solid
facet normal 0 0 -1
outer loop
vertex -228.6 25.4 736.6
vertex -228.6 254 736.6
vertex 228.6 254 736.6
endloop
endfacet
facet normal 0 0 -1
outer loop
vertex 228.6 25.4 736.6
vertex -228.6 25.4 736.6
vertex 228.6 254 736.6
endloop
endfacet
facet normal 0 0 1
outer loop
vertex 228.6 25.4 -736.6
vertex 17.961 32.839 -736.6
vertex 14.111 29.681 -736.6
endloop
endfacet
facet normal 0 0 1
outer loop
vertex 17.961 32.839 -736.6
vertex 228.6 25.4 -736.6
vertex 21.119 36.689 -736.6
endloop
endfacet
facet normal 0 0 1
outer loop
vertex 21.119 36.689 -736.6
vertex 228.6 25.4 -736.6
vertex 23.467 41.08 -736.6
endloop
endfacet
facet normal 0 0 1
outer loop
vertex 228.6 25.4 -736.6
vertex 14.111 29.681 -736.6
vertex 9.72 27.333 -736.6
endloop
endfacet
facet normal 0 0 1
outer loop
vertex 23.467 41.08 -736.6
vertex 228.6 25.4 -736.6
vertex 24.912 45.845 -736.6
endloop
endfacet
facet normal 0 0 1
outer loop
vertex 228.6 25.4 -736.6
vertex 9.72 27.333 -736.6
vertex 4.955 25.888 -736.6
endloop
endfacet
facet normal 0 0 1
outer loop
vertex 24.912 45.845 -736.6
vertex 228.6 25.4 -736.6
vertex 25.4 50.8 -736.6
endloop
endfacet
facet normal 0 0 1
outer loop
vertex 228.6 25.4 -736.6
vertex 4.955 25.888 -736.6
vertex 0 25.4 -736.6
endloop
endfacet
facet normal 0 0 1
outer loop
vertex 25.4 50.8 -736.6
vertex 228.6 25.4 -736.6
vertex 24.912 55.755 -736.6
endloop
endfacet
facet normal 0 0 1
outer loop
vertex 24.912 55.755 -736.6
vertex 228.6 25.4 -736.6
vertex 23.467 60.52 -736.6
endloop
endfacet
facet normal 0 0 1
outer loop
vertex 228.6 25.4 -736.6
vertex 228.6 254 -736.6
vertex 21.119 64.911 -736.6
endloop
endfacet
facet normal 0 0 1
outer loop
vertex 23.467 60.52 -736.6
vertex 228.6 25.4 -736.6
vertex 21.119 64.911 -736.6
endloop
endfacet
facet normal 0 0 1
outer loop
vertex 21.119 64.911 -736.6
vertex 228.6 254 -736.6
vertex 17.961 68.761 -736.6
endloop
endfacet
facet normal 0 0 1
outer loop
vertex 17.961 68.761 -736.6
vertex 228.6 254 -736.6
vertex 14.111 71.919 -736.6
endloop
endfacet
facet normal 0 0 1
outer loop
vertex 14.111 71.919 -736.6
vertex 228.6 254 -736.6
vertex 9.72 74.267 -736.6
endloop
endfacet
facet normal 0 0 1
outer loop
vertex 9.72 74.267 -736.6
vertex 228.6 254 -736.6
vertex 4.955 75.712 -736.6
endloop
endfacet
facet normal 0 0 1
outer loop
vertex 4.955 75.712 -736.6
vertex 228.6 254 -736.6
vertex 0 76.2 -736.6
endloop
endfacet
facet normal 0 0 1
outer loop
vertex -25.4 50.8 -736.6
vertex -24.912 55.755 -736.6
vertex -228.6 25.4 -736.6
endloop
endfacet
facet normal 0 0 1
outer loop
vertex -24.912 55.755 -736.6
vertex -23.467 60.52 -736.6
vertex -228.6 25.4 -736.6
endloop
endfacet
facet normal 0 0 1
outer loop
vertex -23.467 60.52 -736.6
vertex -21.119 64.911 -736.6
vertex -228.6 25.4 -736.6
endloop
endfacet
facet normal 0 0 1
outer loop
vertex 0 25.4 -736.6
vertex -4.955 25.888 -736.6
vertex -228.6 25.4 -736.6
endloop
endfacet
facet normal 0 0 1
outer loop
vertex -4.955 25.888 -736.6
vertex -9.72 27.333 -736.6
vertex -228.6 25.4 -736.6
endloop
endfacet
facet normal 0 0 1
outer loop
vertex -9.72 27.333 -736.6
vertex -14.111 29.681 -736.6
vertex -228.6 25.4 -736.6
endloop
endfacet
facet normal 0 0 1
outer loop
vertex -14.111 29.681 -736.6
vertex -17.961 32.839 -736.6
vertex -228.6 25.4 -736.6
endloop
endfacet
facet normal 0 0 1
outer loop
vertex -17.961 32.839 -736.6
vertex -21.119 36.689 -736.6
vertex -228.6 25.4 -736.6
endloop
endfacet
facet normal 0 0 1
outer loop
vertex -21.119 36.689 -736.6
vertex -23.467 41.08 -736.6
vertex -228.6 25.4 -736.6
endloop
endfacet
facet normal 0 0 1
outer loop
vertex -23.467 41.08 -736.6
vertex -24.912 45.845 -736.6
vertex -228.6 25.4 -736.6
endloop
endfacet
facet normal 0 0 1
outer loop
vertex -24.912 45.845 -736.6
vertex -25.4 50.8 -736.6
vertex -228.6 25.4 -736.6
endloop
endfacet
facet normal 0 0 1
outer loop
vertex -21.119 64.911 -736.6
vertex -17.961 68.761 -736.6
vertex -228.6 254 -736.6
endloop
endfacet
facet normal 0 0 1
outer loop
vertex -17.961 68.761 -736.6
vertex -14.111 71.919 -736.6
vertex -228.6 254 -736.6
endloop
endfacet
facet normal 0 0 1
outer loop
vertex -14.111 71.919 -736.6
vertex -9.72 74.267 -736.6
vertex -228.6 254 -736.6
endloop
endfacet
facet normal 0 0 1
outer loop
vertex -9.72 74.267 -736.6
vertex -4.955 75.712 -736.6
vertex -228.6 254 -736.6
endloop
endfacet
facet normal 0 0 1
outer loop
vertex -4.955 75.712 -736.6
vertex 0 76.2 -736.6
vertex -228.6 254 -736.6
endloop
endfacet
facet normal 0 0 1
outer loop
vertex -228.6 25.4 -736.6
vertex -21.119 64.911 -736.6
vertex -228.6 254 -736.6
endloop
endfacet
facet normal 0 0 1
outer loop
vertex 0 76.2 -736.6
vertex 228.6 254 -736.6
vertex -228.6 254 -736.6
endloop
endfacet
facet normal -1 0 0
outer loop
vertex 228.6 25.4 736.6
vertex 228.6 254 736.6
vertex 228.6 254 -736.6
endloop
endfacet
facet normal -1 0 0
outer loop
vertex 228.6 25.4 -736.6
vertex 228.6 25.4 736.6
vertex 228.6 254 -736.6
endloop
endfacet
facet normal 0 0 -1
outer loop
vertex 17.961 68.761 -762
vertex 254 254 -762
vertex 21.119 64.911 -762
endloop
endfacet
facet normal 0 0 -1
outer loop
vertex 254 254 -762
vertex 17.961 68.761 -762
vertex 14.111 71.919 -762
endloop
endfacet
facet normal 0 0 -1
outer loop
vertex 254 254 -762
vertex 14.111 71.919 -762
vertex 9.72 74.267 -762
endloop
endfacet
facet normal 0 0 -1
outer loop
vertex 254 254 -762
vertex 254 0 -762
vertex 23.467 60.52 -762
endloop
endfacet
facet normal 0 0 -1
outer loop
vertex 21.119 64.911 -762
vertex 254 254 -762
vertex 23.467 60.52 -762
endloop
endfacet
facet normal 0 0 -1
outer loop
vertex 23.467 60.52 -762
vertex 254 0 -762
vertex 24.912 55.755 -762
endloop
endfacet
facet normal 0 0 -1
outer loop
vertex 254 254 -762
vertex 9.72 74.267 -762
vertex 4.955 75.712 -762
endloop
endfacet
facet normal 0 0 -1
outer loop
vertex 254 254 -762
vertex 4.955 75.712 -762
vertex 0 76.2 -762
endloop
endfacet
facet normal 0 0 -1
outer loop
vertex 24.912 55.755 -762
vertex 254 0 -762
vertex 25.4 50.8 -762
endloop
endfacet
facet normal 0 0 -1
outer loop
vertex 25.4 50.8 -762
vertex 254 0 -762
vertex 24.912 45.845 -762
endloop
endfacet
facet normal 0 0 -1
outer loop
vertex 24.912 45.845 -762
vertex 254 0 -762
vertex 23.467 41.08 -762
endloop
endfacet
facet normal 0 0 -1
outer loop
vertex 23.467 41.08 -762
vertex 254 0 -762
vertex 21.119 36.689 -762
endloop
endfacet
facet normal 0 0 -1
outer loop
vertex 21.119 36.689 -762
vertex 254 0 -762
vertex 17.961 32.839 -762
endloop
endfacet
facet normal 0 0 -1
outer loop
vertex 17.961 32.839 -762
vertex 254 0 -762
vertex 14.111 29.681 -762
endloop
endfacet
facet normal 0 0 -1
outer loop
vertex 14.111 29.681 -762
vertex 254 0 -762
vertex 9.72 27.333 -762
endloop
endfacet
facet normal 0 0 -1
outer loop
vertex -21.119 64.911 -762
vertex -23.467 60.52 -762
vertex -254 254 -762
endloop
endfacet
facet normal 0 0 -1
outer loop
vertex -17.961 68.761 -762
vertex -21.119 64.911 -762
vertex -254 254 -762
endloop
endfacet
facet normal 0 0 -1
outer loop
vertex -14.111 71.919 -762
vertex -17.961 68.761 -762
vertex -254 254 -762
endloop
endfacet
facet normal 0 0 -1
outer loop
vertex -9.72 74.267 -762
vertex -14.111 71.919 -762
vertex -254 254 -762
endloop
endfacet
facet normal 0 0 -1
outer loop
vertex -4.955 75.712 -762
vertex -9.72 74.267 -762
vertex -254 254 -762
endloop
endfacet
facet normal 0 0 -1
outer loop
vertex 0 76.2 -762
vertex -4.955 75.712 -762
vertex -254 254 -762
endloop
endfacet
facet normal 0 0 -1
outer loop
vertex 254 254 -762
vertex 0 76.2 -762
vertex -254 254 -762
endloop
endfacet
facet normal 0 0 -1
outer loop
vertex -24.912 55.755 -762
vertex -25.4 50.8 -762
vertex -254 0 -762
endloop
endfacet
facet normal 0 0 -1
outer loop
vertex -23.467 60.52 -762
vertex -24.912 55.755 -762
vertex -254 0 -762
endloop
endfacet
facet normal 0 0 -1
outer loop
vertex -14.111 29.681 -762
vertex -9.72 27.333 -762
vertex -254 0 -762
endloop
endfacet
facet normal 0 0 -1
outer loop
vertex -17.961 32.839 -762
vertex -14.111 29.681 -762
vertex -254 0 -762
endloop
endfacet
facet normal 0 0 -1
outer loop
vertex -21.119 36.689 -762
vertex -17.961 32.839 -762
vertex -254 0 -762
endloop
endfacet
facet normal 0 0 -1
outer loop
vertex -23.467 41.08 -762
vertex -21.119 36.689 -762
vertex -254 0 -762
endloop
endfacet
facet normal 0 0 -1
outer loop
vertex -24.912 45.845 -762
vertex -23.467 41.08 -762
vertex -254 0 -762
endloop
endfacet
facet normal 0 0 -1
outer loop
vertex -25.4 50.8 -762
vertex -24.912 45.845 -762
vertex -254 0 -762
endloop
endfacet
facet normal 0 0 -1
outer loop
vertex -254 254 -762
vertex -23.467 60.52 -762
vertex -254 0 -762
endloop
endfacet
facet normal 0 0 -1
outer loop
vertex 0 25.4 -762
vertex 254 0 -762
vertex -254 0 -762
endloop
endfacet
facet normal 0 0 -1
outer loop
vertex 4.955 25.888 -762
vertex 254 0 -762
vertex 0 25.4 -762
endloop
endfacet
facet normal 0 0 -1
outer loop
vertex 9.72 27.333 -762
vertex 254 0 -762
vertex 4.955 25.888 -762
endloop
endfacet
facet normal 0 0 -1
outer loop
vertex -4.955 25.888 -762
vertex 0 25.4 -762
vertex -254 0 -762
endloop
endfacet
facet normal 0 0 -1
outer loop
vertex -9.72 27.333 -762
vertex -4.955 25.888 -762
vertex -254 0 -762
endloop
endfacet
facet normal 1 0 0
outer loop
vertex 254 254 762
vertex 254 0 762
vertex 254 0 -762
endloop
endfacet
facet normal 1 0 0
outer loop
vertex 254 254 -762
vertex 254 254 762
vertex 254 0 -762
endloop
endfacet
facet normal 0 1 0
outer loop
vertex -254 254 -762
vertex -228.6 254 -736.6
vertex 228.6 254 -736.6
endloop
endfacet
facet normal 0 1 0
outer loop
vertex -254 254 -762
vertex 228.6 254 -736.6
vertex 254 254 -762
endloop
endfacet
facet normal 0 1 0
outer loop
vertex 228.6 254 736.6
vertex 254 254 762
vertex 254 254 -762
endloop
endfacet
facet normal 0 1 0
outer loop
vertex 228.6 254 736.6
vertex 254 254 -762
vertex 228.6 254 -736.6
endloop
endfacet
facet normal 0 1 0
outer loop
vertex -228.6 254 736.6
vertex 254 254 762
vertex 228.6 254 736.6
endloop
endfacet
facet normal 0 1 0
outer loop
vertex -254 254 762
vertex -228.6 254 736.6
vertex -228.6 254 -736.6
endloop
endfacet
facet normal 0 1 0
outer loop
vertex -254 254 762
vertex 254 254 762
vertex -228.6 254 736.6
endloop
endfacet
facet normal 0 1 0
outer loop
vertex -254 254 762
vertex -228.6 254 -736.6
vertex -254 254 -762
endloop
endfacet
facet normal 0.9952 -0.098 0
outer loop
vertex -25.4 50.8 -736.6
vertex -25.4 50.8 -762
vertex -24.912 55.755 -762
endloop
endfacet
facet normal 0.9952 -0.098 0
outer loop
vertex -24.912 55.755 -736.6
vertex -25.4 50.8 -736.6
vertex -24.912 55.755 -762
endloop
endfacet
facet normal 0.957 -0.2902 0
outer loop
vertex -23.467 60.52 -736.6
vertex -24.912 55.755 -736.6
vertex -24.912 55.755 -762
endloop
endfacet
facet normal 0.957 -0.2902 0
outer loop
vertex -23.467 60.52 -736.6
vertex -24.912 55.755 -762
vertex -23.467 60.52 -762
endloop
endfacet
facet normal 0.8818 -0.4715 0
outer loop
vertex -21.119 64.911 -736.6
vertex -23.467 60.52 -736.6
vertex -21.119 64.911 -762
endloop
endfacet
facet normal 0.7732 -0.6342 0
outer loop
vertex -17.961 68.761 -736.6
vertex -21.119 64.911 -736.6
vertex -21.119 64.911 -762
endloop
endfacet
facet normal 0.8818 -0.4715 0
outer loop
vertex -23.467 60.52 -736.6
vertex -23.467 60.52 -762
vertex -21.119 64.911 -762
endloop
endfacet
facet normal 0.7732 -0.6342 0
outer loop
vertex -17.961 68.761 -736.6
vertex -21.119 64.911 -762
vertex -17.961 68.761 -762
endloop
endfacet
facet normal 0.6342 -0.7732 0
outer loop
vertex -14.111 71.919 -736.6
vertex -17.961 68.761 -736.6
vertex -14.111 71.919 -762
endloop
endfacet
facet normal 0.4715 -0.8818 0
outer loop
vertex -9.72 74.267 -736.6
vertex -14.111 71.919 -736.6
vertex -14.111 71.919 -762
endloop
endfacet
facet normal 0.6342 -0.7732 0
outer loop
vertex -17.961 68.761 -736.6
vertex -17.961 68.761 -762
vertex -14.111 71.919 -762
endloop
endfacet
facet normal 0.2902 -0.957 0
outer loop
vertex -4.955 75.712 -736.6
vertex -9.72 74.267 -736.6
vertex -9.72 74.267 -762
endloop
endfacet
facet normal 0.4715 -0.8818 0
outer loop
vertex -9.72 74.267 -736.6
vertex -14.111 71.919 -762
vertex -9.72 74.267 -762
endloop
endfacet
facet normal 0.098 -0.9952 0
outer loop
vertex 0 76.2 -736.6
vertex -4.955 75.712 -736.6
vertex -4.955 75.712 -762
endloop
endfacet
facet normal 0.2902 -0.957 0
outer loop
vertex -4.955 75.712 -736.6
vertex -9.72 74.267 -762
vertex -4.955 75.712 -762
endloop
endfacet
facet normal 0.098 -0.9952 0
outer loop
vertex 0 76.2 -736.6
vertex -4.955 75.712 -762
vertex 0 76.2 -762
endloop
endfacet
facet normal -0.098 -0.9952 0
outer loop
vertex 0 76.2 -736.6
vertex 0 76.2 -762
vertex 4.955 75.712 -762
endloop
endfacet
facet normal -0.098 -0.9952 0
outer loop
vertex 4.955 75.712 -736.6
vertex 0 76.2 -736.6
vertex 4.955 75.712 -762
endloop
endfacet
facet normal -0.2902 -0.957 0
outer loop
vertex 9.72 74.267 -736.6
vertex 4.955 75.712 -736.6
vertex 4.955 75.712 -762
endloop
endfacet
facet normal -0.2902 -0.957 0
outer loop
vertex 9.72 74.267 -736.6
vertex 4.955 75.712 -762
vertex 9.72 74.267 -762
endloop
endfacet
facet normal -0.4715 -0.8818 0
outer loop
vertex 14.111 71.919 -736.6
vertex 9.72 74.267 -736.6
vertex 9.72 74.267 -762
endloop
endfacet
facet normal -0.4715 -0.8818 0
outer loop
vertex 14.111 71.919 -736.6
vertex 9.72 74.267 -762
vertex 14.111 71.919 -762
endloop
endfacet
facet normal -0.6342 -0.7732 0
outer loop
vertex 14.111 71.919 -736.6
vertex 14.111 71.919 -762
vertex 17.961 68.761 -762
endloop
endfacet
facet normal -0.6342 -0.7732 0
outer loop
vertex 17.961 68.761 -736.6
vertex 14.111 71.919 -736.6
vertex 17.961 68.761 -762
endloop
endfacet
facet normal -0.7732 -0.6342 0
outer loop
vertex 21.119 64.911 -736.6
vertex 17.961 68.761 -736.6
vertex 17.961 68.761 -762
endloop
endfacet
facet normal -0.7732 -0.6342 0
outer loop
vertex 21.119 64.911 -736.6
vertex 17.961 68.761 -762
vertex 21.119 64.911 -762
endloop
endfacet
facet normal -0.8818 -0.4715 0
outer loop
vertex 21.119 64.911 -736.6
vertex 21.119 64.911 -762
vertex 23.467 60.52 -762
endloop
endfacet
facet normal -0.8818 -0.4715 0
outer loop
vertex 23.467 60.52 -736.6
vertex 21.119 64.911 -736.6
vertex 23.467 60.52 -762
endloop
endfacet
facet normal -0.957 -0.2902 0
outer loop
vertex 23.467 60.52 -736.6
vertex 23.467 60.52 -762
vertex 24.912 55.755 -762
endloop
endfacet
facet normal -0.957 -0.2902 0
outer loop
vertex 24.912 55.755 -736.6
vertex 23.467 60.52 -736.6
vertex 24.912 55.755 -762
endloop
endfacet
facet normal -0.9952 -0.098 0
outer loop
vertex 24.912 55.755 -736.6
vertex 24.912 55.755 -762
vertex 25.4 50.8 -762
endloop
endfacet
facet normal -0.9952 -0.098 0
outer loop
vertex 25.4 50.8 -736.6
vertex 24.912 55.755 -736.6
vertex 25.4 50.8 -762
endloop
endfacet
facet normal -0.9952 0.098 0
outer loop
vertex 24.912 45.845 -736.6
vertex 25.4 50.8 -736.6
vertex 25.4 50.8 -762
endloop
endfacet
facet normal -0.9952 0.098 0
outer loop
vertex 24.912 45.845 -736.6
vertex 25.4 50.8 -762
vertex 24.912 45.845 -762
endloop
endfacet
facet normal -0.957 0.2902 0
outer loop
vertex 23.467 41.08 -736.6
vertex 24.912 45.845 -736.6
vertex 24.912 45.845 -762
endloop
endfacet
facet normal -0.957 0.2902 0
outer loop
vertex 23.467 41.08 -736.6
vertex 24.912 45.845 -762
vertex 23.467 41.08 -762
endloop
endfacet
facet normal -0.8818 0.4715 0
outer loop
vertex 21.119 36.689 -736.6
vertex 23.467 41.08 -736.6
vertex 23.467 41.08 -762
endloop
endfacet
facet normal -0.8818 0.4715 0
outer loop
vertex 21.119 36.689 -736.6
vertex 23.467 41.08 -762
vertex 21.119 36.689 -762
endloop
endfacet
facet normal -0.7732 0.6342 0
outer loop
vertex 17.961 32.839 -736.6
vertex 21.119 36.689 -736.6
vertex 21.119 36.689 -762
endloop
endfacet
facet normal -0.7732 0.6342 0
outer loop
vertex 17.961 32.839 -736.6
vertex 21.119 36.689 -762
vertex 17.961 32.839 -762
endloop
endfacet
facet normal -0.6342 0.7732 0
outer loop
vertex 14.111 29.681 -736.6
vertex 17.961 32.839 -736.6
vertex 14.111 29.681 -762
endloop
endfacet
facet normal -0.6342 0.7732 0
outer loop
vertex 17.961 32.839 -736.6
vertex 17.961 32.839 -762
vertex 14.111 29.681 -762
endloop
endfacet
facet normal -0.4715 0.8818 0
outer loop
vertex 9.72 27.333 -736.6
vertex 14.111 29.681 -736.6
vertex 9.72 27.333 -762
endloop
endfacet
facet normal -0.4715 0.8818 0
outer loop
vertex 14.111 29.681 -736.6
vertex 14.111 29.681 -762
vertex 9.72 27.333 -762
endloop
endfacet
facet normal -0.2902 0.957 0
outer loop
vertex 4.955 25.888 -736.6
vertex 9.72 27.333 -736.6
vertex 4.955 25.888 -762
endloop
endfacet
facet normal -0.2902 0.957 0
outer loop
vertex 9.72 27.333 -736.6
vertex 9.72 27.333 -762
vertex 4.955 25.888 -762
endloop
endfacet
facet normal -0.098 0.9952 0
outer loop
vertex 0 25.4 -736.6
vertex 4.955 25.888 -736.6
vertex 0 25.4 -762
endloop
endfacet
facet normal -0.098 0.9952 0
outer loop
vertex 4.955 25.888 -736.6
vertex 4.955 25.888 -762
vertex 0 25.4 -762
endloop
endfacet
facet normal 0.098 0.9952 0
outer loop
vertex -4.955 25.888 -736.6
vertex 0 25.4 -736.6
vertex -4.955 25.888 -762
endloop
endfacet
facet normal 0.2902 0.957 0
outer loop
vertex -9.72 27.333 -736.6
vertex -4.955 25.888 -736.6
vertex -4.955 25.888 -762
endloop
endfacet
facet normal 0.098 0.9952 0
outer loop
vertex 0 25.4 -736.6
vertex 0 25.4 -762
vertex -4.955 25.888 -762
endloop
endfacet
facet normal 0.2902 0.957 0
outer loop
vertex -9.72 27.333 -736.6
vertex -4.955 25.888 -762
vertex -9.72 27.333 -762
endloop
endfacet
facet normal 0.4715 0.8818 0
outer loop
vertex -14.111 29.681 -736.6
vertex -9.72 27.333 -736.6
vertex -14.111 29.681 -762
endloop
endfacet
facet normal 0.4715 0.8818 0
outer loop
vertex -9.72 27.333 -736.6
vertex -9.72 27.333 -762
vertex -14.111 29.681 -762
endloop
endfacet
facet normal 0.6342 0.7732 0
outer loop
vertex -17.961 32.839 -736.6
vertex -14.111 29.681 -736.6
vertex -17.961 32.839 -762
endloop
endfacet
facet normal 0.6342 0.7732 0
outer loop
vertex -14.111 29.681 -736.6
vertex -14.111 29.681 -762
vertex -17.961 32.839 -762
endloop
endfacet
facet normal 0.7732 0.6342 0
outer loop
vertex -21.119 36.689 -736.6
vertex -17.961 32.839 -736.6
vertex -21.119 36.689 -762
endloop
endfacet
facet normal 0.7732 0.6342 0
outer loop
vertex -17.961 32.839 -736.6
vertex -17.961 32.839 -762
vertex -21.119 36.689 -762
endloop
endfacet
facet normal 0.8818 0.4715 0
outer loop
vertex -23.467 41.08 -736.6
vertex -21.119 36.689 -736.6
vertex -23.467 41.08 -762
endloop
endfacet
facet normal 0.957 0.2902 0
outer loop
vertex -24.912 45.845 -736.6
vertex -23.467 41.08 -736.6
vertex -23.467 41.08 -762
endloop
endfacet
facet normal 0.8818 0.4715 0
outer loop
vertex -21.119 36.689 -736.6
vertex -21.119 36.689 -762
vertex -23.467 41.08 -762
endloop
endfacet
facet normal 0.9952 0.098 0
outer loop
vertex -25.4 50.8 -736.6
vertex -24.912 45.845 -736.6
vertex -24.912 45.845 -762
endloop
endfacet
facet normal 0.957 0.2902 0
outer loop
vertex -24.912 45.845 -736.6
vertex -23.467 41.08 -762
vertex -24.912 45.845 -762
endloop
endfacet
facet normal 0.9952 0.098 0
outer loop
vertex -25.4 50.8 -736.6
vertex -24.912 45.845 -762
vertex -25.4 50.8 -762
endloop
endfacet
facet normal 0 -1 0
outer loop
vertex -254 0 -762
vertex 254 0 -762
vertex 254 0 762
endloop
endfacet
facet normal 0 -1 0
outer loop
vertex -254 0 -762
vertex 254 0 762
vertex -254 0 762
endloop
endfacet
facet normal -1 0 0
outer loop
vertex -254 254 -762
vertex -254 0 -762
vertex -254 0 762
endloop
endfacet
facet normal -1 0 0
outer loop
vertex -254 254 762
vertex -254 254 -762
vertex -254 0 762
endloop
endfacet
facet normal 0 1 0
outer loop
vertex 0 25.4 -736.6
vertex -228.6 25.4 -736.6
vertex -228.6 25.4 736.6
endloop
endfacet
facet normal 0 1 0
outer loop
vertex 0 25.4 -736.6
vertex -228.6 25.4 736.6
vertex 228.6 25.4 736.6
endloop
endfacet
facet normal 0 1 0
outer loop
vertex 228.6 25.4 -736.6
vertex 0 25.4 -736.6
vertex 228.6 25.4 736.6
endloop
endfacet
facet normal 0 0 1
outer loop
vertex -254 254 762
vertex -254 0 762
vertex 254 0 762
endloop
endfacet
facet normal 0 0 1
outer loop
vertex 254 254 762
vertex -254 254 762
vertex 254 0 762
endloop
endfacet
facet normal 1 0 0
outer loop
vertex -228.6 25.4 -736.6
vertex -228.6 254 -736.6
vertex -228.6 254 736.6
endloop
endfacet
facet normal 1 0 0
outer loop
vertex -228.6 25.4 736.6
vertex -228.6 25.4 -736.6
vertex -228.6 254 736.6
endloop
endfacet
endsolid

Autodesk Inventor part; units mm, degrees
ref_plane "YZ Plane" through (0, 0, 0) normal (1, 0, 0) x (0, 1, 0)
ref_plane "XZ Plane" through (0, 0, 0) normal (0, 1, 0) x (-1, 0, 0)
ref_plane "XY Plane" through (0, 0, 0) normal (0, 0, 1) x (1, 0, 0)
sketch "Sketch1" plane through (0, 0, 0) normal (0, 1, 0) x (-1, 0, 0)
  line L0 (254, 762) -> (-254, 762)
  line L1 (-254, 762) -> (-254, -762)
  line L2 (-254, -762) -> (254, -762)
  line L3 (254, -762) -> (254, 762)
  line L4 (254, 762) -> (-254, -762) construction
  line L5 (-254, 762) -> (254, -762) construction
  point P0 (0, 0)
  dimension "d0" = 508
  dimension "d1" = 1524
extrude "Extrusion1" add sketch "Sketch1" along normal blind 254
sketch "Sketch2" plane through (0, 254, 0) normal (0, 1, 0) x (1, 0, 0)
  line L0 (-254, -762) -> (254, -762) projected
  line L1 (254, 762) -> (-254, 762)
  line L2 (-254, 762) -> (-254, -762)
  line L3 (-254, -762) -> (254, -762)
  line L4 (254, -762) -> (254, 762)
  line L5 (254, 762) -> (-254, -762) construction
  line L6 (-254, 762) -> (254, -762) construction
  line L7 (0, -762) -> (0, -736.6)
  line L8 (-254, 762) -> (-254, -762) projected
  line L9 (-254, 0) -> (-228.6, 0)
  line L10 (228.6, 736.6) -> (-228.6, 736.6)
  line L11 (-228.6, 736.6) -> (-228.6, -736.6)
  line L12 (-228.6, -736.6) -> (228.6, -736.6)
  line L13 (228.6, -736.6) -> (228.6, 736.6)
  line L14 (228.6, 736.6) -> (-228.6, -736.6) construction
  line L15 (-228.6, 736.6) -> (228.6, -736.6) construction
  point P0 (0, 0)
  dimension "d4" = 25.4
  dimension "d5" = 25.4
extrude "Extrusion2" cut sketch "Sketch2" against normal blind 228.6 contours L12 L11 L10 L13
sketch "Sketch3" plane through (254, 0, -762) normal (0, 0, -1) x (-1, 0, 0)
  line L0 (25.4, 254) -> (482.6, 254) projected
  line L1 (254, 254) -> (254, 50.8) construction
  circle A0 centre (254, 50.8) radius 25.4
  point P0 (254, 0)
  dimension "d8" = 203.2
  dimension "d9" = 50.8
extrude "Extrusion3" cut sketch "Sketch3" against normal blind 228.6
properties part number "Trough"
